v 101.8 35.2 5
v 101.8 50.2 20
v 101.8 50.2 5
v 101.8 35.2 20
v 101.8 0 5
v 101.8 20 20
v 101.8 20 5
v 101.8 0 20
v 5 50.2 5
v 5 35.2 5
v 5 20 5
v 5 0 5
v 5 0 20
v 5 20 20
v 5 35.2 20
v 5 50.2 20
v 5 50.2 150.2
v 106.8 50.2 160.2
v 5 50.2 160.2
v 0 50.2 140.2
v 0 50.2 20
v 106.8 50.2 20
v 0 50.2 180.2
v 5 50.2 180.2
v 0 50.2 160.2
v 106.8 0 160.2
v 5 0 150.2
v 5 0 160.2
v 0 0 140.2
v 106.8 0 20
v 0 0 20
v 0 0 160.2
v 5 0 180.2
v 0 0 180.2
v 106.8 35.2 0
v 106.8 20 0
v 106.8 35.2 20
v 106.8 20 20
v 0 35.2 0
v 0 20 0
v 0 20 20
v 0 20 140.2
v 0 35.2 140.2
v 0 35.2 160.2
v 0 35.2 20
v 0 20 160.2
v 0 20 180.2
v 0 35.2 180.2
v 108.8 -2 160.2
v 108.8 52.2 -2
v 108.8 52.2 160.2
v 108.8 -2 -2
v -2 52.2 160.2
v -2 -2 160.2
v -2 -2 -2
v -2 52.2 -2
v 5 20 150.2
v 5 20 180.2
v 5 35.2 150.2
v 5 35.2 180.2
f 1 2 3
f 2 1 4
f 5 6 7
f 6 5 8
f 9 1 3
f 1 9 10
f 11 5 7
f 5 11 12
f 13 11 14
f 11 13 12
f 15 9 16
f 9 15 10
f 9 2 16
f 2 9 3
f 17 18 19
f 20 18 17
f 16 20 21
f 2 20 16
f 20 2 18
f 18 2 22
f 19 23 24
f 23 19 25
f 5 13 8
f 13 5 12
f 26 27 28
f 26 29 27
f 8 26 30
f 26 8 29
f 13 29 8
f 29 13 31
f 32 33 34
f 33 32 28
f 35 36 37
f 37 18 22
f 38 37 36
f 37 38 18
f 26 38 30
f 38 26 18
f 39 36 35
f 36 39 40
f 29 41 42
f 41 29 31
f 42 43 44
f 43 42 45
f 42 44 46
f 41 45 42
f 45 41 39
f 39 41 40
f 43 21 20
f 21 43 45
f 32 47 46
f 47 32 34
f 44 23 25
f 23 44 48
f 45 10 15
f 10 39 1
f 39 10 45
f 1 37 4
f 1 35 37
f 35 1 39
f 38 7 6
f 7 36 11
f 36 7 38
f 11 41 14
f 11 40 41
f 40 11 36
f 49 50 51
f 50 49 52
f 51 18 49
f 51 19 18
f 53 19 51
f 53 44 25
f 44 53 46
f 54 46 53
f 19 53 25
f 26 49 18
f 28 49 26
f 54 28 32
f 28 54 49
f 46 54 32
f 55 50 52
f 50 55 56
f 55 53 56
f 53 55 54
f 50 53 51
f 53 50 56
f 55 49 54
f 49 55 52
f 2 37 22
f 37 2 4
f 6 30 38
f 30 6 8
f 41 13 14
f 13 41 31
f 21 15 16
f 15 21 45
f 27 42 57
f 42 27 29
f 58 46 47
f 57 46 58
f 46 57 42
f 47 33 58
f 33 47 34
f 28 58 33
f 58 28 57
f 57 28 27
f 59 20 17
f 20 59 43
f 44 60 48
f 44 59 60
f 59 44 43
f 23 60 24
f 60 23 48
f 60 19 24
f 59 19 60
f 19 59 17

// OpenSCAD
/*
 * Case for a TADA68 keyboard
 *
 * Copyright (C) 2018  Matthias Gazzari
 *
 * This program is free software: you can redistribute it and/or modify
 * it under the terms of the GNU General Public License as published by
 * the Free Software Foundation, either version 3 of the License, or
 * (at your option) any later version.
 *
 * This program is distributed in the hope that it will be useful,
 * but WITHOUT ANY WARRANTY; without even the implied warranty of
 * MERCHANTABILITY or FITNESS FOR A PARTICULAR PURPOSE.  See the
 * GNU General Public License for more details.
 *
 * You should have received a copy of the GNU General Public License
 * along with this program.  If not, see <https://www.gnu.org/licenses/>.
*/

// TADA68 properties in mm
tada_frame = [106.6, 15, 316] + [0.2, 0.2, 0.4];
key_cap_height = 15;
tada_bottom_height = 20;
tada_edge = 5;
tada_usb_clearance = 18;

// case properties in mm
wall = 2;
nib_height = 40;



// one half of the full case
tada_case_half(tada_frame, key_cap_height, tada_bottom_height, tada_edge, wall, tada_usb_clearance, nib_height);



module tada_case_half(tada_frame, key_cap_height, tada_bottom_height, tada_edge, wall, tada_usb_clearance, nib_height) {
	bbox = [tada_frame.x, tada_frame.y + key_cap_height + tada_bottom_height, tada_frame.z / 2];
	outer = bbox + [wall, wall, wall] * 2;
	nib_size = [tada_edge, nib_height, key_cap_height];
	// case
	difference() {
		translate(-1 * [wall, wall, wall]) cube(outer);
		translate([0, 0, wall + tada_usb_clearance]) cube(bbox);
		tada(tada_frame, key_cap_height, tada_bottom_height, tada_edge);
	}
	// nibs
	translate([0, 0, tada_frame.z / 2 + wall - nib_size.y / 2]) nib([tada_edge, nib_height, tada_bottom_height]);
	translate([0, tada_frame.y + tada_bottom_height, tada_frame.z / 2 + wall - nib_size.y / 2]) nib([tada_edge, nib_height, key_cap_height]);
}

module tada(frame, key_cap_height, bottom_height, edge) {
	inner = [frame.x - 2 * edge,  frame.y + key_cap_height + bottom_height, frame.z - 2 * edge];

	translate([edge, 0, edge]) cube(inner);
	translate([0, bottom_height, 0]) cube(frame);
}

module nib(size) {
	translate([0, size.z, 0])
	rotate([90, 0, 0])
	linear_extrude(size.z) polygon([
		[0,0],
		[0, size.y],
		[size.x, size.y],
		[size.x, size.y / 4]
	]);
}
